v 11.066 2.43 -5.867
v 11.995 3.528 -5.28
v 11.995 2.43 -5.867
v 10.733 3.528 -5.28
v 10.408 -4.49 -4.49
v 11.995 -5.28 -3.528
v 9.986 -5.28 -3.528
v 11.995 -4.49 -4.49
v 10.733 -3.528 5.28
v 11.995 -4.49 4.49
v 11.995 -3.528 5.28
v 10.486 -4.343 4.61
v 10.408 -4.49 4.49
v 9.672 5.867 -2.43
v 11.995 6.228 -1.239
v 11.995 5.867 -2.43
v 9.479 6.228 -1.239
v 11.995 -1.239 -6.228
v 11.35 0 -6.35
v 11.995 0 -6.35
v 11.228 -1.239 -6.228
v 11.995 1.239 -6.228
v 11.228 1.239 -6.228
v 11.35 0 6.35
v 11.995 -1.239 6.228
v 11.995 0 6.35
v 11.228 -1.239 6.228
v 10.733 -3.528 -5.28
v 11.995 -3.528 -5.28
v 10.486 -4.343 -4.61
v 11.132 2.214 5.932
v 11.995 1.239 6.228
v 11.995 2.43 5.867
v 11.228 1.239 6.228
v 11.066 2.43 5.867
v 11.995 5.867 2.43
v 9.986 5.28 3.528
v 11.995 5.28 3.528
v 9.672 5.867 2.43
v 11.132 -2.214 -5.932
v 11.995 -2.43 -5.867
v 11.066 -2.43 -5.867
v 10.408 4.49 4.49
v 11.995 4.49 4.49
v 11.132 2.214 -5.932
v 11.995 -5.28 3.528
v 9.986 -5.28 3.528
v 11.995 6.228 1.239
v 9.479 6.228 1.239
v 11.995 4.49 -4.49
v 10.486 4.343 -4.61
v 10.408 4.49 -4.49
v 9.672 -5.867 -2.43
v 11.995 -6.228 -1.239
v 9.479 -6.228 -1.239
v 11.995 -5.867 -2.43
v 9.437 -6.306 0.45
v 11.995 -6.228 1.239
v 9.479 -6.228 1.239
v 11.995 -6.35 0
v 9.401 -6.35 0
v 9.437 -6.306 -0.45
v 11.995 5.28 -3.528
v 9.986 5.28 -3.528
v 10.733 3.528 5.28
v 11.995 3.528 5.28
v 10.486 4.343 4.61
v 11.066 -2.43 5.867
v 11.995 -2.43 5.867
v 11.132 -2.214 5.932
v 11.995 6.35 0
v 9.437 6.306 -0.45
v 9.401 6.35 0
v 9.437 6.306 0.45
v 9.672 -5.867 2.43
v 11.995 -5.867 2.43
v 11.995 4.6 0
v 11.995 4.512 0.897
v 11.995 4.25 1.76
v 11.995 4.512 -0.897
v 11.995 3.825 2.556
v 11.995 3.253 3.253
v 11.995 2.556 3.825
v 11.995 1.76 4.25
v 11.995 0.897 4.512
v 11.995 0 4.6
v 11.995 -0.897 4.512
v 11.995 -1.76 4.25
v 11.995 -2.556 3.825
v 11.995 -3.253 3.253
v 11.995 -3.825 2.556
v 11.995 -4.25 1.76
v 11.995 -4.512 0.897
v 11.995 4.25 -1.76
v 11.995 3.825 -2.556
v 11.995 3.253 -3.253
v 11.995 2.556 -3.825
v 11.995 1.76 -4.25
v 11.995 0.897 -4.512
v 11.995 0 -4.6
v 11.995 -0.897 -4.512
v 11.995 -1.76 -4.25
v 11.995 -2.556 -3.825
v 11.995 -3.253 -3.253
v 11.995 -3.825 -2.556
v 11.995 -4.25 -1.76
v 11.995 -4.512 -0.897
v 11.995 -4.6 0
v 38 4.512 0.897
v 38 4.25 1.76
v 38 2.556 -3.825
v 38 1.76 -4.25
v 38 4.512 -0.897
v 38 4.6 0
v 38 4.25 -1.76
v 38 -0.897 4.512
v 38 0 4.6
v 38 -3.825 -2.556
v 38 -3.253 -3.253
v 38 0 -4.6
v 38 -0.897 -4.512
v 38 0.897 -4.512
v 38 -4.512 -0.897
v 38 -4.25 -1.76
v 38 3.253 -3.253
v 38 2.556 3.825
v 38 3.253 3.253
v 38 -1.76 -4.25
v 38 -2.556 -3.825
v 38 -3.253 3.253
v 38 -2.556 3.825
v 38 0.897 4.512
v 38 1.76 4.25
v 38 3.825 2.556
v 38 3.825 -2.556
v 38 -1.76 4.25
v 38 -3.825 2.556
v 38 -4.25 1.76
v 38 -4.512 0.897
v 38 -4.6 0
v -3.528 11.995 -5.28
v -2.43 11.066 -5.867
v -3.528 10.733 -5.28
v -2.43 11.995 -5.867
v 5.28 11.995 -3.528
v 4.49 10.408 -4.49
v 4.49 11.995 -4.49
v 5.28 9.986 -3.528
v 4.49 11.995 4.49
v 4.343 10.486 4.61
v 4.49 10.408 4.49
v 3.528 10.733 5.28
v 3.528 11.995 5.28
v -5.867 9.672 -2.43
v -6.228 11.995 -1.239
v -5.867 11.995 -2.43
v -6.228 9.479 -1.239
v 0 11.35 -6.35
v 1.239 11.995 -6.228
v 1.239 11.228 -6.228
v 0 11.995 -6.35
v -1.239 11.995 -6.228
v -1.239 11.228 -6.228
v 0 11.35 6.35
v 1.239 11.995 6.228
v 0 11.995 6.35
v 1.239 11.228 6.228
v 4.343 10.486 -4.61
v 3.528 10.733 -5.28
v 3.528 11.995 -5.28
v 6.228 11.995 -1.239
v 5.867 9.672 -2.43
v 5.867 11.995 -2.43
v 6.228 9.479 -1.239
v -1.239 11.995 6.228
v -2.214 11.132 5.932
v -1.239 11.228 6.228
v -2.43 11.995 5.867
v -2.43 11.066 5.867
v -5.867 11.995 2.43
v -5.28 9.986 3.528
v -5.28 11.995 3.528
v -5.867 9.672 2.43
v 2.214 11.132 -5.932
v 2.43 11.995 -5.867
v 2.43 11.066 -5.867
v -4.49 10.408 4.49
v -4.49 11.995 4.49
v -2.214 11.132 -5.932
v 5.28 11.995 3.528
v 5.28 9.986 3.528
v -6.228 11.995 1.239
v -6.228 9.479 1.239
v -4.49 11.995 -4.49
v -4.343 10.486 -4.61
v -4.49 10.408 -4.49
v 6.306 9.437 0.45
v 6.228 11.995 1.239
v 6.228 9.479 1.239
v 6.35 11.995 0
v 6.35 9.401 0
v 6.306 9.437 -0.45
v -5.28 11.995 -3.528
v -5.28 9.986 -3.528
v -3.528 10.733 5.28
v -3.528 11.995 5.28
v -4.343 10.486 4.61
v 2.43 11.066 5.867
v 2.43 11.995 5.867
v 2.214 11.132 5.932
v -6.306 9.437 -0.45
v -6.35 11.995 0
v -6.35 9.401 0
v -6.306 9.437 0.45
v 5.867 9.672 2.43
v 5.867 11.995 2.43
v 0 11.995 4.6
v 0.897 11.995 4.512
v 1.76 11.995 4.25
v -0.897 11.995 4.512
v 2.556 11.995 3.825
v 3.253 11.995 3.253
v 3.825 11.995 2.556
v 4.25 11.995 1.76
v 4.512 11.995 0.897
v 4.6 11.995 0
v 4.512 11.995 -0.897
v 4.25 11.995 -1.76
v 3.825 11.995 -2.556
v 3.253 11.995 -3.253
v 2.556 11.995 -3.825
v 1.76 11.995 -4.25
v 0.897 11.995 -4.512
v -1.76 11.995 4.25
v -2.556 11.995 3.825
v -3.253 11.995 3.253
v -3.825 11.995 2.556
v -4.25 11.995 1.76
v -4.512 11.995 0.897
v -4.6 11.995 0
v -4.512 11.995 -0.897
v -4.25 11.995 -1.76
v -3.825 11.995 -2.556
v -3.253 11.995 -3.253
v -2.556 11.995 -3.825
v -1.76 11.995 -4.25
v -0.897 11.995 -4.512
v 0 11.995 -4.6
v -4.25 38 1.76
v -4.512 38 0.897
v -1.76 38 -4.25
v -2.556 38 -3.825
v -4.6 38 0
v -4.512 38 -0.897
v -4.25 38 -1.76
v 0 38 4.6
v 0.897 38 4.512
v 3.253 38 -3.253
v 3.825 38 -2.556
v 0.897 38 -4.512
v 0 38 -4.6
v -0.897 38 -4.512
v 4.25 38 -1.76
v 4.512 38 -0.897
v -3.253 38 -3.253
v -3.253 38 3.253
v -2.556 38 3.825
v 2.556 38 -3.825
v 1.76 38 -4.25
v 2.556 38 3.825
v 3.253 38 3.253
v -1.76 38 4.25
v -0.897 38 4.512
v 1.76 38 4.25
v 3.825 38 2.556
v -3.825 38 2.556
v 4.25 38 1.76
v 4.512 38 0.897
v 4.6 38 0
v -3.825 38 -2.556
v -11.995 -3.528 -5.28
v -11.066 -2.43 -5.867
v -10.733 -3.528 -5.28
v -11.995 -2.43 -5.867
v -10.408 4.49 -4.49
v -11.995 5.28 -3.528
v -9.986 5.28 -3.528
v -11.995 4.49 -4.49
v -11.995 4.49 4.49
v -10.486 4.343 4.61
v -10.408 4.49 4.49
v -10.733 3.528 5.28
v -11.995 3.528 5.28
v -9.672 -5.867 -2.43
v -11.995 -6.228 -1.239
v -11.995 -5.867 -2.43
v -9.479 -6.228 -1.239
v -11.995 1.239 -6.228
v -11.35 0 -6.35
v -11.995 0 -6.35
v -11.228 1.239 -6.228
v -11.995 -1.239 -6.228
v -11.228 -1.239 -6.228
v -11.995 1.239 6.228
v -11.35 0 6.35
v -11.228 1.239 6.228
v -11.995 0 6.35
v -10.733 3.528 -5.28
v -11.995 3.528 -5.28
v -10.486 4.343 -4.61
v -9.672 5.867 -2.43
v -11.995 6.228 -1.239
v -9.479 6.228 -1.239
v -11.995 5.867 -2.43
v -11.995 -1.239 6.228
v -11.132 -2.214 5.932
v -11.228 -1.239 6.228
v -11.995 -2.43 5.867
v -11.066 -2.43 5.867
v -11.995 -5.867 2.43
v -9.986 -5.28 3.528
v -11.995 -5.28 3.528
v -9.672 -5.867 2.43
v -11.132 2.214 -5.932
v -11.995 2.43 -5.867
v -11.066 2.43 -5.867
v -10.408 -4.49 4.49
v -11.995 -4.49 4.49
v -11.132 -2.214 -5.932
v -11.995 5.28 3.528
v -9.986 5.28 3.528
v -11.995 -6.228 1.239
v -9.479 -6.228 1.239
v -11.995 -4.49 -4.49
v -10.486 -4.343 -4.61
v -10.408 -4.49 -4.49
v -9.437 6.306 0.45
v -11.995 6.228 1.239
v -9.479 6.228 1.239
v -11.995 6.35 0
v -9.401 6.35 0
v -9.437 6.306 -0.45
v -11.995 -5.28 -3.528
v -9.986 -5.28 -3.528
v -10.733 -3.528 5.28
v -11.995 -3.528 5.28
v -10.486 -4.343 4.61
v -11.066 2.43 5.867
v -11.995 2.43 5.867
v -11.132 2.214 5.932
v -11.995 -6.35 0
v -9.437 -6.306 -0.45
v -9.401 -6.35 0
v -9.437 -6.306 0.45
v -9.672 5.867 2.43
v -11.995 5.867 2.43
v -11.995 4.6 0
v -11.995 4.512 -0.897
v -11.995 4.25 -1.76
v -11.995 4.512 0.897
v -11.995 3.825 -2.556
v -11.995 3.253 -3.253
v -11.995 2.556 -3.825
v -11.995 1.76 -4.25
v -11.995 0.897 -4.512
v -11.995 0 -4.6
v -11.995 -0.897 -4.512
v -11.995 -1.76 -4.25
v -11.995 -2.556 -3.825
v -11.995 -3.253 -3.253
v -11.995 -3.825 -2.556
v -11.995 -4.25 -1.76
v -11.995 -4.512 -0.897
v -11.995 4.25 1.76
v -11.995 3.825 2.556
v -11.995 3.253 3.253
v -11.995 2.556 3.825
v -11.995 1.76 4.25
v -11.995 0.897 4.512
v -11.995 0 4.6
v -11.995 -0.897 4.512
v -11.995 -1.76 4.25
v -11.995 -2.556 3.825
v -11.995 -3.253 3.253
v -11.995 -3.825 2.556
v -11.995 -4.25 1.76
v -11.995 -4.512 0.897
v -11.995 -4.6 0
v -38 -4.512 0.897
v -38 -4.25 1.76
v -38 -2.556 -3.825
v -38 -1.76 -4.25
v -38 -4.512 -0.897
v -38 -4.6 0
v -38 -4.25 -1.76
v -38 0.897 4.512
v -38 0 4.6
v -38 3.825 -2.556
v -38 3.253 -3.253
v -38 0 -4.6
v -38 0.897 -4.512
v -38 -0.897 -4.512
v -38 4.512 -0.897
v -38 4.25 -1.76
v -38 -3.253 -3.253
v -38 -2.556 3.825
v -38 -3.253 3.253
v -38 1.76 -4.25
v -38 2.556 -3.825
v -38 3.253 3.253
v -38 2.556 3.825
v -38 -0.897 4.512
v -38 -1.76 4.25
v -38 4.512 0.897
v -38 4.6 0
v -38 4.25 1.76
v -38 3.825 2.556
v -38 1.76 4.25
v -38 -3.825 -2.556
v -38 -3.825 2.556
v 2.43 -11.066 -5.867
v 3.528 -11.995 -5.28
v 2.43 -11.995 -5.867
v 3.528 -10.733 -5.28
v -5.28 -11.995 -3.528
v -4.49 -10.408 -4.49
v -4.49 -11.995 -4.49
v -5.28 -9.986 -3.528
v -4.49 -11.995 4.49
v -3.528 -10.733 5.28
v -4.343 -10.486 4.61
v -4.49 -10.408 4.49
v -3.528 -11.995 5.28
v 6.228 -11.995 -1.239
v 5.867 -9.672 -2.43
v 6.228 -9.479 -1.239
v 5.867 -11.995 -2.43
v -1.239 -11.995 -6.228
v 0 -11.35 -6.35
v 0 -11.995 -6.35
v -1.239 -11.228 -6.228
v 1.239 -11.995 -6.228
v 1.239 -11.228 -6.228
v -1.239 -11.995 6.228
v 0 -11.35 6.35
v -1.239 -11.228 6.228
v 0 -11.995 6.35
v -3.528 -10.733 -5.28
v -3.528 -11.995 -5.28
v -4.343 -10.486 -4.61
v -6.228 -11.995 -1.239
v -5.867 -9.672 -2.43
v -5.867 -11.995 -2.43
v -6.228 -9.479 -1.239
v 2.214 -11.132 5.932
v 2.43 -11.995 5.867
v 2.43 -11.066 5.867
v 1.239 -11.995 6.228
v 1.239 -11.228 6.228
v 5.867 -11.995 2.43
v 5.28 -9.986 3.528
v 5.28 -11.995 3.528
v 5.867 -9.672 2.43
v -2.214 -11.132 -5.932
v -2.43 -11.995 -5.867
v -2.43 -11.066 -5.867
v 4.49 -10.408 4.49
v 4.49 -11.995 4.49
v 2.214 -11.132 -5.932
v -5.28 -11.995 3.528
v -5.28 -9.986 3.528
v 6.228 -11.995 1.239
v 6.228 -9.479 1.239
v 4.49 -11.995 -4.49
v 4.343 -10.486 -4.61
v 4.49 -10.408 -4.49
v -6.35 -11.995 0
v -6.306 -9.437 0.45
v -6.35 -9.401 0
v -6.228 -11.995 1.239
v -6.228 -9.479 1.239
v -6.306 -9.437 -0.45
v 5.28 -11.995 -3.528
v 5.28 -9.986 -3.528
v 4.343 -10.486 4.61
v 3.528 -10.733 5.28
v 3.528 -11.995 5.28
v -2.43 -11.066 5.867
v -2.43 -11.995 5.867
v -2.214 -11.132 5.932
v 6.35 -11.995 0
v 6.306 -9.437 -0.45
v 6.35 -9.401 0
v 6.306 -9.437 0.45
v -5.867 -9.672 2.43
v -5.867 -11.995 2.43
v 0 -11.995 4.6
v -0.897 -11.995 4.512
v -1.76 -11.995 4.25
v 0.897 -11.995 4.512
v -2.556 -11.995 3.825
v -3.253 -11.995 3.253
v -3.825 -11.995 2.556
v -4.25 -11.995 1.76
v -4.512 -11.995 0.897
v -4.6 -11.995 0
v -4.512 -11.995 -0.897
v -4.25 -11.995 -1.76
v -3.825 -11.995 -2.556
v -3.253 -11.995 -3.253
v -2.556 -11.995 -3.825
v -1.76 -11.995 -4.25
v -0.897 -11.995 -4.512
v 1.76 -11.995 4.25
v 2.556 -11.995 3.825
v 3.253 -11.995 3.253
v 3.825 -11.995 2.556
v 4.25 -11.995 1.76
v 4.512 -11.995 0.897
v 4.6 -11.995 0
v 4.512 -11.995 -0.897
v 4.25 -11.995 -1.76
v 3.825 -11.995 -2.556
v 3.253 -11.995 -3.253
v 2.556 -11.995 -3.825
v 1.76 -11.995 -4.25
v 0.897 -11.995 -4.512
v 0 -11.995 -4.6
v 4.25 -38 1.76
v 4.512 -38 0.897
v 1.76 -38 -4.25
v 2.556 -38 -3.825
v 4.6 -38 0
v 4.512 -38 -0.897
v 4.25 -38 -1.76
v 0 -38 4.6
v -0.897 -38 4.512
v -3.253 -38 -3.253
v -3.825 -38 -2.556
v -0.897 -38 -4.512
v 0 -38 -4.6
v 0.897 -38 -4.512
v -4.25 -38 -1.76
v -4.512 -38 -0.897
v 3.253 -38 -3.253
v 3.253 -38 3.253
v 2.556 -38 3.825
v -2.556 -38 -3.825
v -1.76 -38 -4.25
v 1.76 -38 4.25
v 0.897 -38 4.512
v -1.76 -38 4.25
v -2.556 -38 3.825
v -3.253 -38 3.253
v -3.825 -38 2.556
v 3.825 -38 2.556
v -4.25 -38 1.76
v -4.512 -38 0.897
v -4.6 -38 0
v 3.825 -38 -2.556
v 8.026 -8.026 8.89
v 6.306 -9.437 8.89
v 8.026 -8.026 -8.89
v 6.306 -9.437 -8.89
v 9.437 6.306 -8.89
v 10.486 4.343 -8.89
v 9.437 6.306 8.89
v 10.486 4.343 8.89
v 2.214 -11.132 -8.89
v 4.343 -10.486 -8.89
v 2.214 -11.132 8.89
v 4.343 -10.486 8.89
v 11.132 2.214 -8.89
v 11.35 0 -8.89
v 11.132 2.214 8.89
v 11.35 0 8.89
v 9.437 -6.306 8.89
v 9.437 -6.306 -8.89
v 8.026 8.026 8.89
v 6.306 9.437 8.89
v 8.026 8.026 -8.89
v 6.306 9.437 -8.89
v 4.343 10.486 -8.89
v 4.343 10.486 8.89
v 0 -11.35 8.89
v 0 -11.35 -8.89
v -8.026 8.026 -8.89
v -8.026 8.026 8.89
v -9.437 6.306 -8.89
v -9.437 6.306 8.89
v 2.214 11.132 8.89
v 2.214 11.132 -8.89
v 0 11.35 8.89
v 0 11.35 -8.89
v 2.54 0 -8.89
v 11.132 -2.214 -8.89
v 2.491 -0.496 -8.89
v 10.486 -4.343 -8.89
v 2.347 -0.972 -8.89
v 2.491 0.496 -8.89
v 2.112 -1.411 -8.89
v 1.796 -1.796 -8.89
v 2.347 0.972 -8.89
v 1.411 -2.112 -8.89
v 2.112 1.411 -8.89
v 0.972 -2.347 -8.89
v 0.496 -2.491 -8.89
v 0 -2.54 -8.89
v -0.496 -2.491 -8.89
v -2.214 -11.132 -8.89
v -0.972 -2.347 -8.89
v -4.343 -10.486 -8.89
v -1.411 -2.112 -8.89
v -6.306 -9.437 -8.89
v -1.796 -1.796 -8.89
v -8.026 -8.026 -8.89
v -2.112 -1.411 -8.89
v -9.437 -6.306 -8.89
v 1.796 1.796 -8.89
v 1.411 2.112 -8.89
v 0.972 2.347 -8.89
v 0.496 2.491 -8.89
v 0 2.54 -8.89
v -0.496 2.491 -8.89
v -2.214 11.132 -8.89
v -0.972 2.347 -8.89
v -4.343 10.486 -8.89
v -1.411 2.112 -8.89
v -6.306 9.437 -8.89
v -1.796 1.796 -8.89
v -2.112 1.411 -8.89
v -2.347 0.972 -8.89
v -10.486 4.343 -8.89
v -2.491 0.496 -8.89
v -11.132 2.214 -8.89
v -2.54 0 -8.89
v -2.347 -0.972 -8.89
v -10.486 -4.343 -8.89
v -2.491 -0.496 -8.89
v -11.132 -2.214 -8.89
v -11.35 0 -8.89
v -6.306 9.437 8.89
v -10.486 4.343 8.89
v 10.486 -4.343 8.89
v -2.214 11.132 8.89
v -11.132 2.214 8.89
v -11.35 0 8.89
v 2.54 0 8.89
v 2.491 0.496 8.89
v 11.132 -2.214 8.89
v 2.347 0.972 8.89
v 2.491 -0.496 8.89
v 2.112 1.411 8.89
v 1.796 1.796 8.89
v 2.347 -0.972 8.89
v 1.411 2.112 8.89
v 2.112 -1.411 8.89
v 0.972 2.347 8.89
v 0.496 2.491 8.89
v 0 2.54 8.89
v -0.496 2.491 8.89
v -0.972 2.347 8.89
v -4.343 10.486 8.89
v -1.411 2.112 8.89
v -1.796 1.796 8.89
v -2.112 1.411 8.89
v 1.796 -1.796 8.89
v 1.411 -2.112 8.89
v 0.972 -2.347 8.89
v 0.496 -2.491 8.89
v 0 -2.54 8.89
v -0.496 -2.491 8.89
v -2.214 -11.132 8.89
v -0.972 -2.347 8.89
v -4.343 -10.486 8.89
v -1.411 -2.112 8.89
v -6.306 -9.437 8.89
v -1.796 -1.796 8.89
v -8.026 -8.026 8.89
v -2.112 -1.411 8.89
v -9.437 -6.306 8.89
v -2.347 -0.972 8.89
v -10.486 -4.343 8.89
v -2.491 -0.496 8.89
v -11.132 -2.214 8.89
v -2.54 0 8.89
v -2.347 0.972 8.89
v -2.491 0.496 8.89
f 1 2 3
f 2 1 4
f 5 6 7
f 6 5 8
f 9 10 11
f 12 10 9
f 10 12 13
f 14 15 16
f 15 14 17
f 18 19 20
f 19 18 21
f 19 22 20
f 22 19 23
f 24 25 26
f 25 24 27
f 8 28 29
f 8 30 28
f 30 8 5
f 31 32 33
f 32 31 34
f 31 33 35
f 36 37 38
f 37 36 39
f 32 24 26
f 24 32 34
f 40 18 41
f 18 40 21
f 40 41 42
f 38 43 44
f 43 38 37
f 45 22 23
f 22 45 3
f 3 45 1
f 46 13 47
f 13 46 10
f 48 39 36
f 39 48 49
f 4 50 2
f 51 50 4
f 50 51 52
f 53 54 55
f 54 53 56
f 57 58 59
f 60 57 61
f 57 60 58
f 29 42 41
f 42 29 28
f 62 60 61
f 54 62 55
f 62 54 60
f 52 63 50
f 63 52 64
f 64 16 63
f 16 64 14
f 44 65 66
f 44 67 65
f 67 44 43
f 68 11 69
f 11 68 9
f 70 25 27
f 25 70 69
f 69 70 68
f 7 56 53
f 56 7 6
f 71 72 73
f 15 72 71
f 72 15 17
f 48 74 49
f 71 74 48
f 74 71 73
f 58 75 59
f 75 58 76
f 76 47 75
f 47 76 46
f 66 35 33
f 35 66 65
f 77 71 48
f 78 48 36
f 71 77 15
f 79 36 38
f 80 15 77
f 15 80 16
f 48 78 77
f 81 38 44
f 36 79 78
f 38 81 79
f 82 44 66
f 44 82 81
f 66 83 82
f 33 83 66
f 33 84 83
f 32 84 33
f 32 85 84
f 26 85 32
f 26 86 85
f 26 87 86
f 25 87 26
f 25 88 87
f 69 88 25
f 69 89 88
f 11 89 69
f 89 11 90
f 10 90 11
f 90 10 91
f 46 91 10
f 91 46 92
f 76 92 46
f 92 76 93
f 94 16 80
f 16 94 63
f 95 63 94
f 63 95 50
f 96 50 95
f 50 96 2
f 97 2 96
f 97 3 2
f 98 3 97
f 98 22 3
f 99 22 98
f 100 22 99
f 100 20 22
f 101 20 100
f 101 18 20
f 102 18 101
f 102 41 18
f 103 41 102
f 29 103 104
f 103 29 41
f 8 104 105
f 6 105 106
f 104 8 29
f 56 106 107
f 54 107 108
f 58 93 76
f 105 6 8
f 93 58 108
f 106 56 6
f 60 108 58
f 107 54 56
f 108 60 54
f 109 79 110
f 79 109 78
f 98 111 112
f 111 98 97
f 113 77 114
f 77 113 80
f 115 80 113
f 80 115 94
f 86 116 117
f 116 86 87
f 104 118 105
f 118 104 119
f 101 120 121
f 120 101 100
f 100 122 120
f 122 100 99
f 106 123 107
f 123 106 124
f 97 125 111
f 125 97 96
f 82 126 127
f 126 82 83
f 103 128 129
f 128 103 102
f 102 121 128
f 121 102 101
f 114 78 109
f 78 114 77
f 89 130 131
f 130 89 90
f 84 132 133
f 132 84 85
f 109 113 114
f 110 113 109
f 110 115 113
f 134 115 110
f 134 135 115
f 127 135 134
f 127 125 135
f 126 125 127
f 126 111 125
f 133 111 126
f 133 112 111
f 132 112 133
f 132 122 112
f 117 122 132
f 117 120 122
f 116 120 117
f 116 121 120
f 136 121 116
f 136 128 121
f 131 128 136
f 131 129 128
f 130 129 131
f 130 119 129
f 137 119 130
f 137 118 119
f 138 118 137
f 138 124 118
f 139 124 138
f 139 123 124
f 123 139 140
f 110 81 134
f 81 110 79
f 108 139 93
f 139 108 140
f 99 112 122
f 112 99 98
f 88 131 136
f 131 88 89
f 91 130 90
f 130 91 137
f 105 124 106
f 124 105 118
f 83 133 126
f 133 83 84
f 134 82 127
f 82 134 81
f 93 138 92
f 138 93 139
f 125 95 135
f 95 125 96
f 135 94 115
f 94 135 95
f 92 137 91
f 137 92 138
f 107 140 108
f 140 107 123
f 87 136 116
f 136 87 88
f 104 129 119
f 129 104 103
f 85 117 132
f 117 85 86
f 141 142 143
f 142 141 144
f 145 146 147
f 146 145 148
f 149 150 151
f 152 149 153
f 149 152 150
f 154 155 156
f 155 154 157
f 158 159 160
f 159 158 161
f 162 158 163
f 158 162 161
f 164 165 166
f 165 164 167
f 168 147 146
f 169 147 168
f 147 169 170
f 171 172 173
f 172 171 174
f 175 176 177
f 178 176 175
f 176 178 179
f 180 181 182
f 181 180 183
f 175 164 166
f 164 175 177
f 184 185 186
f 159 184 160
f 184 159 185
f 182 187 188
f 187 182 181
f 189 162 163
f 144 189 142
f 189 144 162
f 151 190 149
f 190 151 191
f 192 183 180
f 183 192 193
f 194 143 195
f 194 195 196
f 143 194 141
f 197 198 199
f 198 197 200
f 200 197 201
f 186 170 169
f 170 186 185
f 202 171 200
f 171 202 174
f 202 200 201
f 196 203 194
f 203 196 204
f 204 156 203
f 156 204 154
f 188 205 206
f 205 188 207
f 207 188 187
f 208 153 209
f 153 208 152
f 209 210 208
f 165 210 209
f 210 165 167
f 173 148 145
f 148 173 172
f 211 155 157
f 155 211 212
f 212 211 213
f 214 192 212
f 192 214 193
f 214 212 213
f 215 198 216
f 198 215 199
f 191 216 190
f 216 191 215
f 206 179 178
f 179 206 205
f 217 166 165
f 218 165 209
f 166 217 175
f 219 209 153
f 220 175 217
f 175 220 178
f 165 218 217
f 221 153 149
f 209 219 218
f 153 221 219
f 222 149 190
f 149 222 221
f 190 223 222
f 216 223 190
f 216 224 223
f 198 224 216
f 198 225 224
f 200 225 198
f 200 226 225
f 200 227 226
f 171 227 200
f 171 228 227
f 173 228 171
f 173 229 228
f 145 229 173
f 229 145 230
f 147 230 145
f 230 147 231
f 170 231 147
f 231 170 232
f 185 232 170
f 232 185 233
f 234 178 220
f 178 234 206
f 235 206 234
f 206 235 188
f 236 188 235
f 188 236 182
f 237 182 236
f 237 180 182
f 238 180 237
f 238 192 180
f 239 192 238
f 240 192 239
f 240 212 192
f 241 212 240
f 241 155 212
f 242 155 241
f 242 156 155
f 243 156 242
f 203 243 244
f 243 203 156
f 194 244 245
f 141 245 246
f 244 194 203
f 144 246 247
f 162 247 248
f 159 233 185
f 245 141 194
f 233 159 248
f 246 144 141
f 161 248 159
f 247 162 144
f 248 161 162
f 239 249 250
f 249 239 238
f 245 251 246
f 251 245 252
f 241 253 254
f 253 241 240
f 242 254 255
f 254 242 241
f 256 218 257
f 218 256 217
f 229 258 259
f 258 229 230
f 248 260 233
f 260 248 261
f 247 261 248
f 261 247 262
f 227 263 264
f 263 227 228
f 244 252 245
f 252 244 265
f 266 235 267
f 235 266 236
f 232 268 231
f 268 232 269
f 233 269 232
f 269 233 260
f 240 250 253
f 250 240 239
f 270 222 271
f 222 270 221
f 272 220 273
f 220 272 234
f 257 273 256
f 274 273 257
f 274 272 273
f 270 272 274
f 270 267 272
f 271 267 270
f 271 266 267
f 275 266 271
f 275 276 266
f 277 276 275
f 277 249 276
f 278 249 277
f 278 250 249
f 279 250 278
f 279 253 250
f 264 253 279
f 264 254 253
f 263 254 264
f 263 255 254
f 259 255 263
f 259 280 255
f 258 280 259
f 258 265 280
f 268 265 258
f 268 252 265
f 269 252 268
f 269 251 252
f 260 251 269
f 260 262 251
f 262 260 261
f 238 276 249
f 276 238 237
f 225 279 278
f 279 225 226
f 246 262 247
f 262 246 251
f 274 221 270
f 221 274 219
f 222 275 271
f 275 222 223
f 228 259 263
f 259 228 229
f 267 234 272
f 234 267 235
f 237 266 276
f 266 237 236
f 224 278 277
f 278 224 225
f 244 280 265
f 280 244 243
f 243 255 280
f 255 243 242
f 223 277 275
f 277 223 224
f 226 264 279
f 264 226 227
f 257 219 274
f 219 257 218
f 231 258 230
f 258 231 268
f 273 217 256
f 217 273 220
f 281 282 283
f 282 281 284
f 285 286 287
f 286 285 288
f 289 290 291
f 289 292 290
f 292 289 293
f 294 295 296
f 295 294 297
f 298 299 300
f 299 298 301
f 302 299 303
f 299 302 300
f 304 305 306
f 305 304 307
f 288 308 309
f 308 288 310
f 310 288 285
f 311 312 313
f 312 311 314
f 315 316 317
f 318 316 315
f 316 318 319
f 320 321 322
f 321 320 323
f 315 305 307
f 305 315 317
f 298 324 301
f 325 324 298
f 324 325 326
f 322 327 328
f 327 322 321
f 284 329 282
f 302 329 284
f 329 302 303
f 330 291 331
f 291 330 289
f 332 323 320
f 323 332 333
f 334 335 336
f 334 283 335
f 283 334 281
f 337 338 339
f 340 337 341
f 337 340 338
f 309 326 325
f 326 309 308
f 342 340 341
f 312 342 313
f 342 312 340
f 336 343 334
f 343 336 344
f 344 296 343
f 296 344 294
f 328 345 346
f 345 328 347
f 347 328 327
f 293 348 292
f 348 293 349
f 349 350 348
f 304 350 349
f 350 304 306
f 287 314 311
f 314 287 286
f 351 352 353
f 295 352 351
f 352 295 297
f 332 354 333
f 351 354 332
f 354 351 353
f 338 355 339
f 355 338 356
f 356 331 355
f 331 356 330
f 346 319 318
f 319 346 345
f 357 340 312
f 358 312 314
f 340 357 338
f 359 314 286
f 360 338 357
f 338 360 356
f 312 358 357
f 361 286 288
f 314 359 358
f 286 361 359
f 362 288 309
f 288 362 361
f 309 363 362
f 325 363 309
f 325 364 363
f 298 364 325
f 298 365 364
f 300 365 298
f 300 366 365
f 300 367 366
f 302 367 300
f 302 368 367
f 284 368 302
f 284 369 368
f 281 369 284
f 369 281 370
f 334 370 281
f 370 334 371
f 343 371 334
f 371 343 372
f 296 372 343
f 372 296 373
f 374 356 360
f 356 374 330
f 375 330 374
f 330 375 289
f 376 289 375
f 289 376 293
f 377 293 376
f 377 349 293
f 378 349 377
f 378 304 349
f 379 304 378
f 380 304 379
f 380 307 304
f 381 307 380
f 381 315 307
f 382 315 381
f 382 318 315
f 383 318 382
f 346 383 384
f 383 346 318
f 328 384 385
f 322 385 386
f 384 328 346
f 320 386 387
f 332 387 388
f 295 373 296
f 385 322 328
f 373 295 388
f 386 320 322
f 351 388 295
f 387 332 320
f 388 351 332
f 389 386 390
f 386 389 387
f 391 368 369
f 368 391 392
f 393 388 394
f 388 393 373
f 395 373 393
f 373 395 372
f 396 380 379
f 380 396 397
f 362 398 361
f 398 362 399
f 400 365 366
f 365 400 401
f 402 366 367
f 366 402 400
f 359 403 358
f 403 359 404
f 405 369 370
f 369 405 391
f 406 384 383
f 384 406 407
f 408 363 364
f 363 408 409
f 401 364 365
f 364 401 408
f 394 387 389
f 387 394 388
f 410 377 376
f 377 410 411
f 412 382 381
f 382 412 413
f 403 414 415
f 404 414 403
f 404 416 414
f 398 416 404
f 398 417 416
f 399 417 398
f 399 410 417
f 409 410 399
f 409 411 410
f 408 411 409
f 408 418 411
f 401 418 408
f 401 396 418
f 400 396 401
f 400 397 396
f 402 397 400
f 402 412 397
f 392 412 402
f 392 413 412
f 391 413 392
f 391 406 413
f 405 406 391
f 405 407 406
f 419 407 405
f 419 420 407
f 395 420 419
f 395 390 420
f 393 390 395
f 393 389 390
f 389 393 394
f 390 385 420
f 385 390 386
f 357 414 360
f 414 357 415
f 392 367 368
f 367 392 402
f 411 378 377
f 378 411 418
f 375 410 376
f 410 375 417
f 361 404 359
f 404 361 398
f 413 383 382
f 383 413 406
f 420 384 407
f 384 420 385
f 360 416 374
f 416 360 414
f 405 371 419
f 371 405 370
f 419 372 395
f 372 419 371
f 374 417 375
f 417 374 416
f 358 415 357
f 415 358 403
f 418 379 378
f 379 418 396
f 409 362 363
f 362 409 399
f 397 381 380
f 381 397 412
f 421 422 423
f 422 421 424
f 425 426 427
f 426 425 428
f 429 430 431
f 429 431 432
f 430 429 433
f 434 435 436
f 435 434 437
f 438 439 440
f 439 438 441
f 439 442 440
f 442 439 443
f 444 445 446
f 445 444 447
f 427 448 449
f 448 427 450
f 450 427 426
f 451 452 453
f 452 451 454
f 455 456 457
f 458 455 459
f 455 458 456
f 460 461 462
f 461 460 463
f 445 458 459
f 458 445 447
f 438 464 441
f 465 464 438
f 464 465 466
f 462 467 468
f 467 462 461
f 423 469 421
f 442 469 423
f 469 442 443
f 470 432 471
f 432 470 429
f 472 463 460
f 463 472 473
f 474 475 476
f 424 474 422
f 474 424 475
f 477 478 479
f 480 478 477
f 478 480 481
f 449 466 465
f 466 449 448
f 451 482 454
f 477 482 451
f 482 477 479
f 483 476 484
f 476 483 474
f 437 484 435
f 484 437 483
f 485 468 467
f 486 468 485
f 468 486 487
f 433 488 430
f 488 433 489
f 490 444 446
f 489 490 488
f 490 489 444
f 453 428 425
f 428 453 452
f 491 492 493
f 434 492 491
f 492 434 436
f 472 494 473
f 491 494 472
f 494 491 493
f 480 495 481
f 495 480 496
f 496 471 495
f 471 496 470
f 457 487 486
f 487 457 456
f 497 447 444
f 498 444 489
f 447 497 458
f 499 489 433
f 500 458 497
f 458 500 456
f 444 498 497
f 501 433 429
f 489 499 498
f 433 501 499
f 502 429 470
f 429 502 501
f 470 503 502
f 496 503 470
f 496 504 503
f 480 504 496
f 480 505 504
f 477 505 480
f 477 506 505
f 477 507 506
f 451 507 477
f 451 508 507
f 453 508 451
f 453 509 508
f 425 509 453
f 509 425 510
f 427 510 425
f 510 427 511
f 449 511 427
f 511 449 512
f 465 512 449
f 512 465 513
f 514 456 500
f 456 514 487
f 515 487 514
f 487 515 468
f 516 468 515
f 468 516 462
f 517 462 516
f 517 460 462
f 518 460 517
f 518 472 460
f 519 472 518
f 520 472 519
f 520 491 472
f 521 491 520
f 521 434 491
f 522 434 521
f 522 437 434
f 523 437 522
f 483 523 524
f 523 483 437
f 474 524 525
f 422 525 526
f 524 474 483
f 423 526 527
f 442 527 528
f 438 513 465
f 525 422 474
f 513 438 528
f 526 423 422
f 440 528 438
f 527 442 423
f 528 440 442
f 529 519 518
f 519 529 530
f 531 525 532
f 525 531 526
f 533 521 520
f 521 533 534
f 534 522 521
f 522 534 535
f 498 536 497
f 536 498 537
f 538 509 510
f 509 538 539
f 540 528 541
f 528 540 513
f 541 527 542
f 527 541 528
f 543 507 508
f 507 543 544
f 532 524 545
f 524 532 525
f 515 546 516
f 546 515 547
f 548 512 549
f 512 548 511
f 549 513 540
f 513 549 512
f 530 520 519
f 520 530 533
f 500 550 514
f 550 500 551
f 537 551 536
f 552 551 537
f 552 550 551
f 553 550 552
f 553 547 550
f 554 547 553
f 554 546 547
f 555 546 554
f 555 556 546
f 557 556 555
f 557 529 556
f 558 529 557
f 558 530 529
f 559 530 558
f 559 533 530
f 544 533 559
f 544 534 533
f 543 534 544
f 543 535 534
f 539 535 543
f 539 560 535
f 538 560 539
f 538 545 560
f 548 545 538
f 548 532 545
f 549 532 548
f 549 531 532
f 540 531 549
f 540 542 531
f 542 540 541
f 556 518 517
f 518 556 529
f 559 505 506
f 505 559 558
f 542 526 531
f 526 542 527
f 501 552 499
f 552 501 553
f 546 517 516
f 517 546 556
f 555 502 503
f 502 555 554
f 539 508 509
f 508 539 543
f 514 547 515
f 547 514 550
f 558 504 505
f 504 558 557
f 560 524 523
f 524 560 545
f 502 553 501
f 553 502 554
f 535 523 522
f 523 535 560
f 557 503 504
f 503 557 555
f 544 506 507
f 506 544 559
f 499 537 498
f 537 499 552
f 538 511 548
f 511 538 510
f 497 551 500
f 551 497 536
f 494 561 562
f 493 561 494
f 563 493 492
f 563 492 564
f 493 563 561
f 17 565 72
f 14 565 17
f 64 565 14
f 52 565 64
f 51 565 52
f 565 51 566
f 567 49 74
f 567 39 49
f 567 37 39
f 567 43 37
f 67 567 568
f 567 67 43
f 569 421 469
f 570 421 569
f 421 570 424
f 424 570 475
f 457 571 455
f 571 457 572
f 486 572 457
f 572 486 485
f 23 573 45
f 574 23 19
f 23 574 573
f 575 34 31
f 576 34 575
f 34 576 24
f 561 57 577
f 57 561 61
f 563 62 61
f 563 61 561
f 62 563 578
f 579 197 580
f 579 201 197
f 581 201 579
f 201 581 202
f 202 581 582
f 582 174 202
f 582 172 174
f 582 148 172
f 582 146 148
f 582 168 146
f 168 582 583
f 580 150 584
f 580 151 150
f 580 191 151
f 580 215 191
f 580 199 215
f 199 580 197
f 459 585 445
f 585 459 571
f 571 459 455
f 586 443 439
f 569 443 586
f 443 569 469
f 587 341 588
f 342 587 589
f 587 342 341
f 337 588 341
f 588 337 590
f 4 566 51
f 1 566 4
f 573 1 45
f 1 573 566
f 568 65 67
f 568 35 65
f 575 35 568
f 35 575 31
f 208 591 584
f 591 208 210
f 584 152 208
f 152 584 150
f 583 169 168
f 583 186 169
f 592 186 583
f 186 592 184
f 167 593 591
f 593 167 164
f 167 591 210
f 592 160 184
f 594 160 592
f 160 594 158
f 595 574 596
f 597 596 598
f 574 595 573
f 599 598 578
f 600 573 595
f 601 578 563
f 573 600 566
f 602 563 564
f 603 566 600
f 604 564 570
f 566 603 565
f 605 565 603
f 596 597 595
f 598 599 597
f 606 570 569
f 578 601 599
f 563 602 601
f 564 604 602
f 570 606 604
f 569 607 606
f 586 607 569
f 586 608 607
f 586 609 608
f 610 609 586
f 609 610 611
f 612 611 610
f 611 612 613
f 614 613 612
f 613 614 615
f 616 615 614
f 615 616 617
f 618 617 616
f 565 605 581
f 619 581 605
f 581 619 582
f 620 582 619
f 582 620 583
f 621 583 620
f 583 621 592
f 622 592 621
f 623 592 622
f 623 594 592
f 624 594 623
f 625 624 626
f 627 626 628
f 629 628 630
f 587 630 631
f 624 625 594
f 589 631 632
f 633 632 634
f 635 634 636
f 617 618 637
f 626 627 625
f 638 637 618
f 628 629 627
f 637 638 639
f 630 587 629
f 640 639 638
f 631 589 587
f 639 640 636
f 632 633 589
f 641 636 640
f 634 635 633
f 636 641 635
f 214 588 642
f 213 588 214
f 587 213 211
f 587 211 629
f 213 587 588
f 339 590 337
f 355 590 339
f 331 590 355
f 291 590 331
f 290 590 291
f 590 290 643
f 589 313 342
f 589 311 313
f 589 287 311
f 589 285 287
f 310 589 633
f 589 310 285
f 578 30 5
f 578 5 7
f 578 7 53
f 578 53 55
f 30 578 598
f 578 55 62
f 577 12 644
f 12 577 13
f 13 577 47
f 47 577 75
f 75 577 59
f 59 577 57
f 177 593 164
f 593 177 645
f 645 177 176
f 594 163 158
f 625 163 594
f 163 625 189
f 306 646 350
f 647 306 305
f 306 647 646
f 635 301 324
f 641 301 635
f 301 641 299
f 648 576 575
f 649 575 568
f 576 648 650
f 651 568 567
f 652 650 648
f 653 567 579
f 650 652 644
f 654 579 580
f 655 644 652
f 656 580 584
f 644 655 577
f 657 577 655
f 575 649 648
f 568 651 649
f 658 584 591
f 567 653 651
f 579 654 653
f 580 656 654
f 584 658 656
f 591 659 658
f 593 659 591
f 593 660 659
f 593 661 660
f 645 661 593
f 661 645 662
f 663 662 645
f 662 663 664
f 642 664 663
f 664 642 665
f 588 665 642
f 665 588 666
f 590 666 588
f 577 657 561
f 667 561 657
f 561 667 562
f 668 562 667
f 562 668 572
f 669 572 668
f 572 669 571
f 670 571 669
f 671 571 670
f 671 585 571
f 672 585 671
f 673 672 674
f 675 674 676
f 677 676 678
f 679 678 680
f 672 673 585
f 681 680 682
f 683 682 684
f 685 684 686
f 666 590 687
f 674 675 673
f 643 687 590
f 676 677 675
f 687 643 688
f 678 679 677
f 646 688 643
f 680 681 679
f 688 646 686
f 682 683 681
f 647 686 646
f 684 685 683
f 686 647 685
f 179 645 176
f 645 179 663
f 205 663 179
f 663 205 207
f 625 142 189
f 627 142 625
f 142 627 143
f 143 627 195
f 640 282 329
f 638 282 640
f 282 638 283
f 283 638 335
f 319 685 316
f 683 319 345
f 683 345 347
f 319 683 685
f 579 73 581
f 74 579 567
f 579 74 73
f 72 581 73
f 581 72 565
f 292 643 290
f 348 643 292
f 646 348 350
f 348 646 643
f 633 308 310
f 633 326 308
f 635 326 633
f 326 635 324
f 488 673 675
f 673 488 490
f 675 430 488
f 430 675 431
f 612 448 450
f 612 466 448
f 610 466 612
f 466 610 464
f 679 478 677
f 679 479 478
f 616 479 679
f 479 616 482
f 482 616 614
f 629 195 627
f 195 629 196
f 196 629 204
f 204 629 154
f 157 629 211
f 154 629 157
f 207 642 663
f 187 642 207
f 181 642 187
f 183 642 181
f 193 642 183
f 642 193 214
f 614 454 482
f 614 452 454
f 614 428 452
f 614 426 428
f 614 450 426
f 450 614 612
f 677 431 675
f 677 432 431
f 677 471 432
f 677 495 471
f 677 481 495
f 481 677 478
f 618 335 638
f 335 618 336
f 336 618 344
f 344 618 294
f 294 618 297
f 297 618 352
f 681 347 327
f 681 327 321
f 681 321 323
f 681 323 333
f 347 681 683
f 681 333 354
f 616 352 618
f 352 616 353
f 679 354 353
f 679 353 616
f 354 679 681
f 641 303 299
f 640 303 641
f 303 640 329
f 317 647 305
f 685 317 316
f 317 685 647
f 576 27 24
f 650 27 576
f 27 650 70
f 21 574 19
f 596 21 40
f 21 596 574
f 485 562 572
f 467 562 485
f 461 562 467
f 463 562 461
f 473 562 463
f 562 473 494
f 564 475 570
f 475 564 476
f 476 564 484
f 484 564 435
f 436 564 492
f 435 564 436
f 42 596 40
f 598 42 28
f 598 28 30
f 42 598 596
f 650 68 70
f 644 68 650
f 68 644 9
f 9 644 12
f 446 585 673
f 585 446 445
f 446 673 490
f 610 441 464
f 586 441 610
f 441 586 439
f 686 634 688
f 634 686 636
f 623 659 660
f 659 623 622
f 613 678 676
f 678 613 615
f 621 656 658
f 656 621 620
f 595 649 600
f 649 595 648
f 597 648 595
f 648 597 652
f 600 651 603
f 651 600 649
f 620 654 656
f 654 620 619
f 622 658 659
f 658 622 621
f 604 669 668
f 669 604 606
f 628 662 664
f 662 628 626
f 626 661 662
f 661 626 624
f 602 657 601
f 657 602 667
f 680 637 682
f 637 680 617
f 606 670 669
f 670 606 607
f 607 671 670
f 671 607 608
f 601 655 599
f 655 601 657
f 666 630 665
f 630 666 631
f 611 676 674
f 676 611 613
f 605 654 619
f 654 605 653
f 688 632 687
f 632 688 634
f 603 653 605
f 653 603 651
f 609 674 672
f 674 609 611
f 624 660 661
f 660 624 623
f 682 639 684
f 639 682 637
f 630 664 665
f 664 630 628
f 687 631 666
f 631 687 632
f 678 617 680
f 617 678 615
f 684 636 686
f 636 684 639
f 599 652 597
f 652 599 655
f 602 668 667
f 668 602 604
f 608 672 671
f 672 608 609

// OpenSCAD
$fn = 32;

// ----------------------------------------------------------------------
// Cardan cross: 76 mm span, 12.7 mm trunnions
// ----------------------------------------------------------------------

// --- parameters (mm) ---
journal_d = 12.7;         // trunnion diameter
arm_len = 38;             // trunnion length from the centre
step_r = 4.32;            // step position from the centre
step_d = 9.2;             // journal diameter after the step
hub_d = 22.7;             // hub diameter
hub_h = 17.78;            // hub height
bore_d = 5.08;            // hub bore

difference() {
  union() {
    /* hub along the joint axis */
    cylinder(h = hub_h, d = hub_d, center = true);
    for (a = [0 : 90 : 270]) rotate([0, 0, a]) {
      /* trunnion, sunk into the hub */
      translate([hub_d / 4, 0, 0]) rotate([0, 90, 0]) cylinder(h = step_r + 2, d = journal_d);
      /* stepped journal out to the tip */
      translate([step_r - 0.5, 0, 0]) rotate([0, 90, 0]) cylinder(h = arm_len + 0.5 - step_r, d = step_d);
    }
  }
  /* lubrication bore through the hub, 2.5 mm clear on both sides */
  translate([0, 0, -hub_h / 2 - 2.5]) cylinder(h = hub_h + 5, d = bore_d);
}
